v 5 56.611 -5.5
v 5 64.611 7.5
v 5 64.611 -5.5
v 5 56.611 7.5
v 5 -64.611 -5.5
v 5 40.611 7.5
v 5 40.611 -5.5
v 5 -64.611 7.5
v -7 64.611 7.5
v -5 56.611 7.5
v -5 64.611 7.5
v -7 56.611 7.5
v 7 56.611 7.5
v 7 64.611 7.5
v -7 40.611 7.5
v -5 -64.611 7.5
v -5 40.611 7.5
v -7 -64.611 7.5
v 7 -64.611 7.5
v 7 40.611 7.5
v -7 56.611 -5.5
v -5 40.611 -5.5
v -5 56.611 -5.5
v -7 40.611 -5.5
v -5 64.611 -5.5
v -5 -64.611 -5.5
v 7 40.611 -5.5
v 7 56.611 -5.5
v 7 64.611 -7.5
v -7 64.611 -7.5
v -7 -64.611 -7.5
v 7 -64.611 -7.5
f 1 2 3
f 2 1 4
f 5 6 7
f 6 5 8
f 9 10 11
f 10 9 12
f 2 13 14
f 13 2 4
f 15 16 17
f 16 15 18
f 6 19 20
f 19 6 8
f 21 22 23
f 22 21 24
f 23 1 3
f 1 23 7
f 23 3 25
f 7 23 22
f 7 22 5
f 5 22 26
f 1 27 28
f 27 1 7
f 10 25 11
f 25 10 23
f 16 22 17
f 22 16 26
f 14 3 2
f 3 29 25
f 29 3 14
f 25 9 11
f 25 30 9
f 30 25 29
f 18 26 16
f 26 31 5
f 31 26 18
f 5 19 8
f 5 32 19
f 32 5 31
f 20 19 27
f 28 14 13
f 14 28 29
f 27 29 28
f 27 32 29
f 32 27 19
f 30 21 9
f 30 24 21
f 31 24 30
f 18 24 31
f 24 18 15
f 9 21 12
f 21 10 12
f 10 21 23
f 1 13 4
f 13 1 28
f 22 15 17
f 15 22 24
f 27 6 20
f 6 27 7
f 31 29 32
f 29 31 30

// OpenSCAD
// Variables
show_full_segment = false;
show_partial_segment = true;

//Part parameters
connector_wall_thickness = 2;
connector_height = 15;

leds_per_channel = 14; //how many leds long should each channel be
channel_wall_thickness = 2;
channel_height = 15; //total channel height in mm

//Bom parameters
ledstrip_width = 10;        //set correctly
ledconnector_length = 35;   //from led strip end to corner
ledconnector_width = 15+(connector_wall_thickness*2);    //at the widest part, and adds wall thickness to make gluing possible
leds_per_meter = 144; 

//automatically calculated variables
channel_length = leds_per_channel*(1000/leds_per_meter);
channel_connection_length = ledconnector_length-ledconnector_width;

// Code
if(show_full_segment == true) {}

if(show_partial_segment == true) {
//connector(3);
channel();
}

module channel() {
    translate([0, 0, 0]) {  
        difference() {
            //all add Objects go here
            union() {
                cube([ledstrip_width+(channel_wall_thickness*2), channel_length+(channel_connection_length*2), channel_height], center=true); //main cube, add length to make connection to connector
            }
            //all subtract objects go here
            union() {
                translate([0, 0, channel_wall_thickness/2]) cube([ledstrip_width, channel_length+(channel_connection_length*2), channel_height-channel_wall_thickness], center=true);
                translate([0, (channel_length/2), channel_wall_thickness/2]) cube([ledstrip_width+(channel_wall_thickness*2), channel_connection_length, channel_height-channel_wall_thickness], center=true);
            }
        }
    }
}



module connector(branch_count) {
    difference() {
        //create all Objects for adding
        union() {    
            for (i = [1:branch_count]) {
                rotate([0, 0, i * 90]) {
                    translate([0, -((ledconnector_length/2)-(ledconnector_width/2)-connector_wall_thickness/2), 0])  {  //offsets the branch
                        union() {
                            //all add objects go here
                            cube([ledconnector_width+(connector_wall_thickness*2), ledconnector_length+connector_wall_thickness, connector_height], center=true); //main body of one branch
                        }
                        
                    }
                }
            }
        }
        //create all Objects for Subtraction
        union(){
            for (i = [1:branch_count]) {
                rotate([0, 0, i * 90]) {
                    translate([0,-((ledconnector_length/2)-(ledconnector_width/2)-connector_wall_thickness/2), 0])  {  //offsets the branch
                        union() {
                            //all subtract objects go here
                            translate([0, -(connector_wall_thickness/2), connector_wall_thickness]) cube([ledconnector_width, ledconnector_length, connector_height], center=true); //main cut of the branch
                        }
                    }
                }
            }
        }
    }
}
